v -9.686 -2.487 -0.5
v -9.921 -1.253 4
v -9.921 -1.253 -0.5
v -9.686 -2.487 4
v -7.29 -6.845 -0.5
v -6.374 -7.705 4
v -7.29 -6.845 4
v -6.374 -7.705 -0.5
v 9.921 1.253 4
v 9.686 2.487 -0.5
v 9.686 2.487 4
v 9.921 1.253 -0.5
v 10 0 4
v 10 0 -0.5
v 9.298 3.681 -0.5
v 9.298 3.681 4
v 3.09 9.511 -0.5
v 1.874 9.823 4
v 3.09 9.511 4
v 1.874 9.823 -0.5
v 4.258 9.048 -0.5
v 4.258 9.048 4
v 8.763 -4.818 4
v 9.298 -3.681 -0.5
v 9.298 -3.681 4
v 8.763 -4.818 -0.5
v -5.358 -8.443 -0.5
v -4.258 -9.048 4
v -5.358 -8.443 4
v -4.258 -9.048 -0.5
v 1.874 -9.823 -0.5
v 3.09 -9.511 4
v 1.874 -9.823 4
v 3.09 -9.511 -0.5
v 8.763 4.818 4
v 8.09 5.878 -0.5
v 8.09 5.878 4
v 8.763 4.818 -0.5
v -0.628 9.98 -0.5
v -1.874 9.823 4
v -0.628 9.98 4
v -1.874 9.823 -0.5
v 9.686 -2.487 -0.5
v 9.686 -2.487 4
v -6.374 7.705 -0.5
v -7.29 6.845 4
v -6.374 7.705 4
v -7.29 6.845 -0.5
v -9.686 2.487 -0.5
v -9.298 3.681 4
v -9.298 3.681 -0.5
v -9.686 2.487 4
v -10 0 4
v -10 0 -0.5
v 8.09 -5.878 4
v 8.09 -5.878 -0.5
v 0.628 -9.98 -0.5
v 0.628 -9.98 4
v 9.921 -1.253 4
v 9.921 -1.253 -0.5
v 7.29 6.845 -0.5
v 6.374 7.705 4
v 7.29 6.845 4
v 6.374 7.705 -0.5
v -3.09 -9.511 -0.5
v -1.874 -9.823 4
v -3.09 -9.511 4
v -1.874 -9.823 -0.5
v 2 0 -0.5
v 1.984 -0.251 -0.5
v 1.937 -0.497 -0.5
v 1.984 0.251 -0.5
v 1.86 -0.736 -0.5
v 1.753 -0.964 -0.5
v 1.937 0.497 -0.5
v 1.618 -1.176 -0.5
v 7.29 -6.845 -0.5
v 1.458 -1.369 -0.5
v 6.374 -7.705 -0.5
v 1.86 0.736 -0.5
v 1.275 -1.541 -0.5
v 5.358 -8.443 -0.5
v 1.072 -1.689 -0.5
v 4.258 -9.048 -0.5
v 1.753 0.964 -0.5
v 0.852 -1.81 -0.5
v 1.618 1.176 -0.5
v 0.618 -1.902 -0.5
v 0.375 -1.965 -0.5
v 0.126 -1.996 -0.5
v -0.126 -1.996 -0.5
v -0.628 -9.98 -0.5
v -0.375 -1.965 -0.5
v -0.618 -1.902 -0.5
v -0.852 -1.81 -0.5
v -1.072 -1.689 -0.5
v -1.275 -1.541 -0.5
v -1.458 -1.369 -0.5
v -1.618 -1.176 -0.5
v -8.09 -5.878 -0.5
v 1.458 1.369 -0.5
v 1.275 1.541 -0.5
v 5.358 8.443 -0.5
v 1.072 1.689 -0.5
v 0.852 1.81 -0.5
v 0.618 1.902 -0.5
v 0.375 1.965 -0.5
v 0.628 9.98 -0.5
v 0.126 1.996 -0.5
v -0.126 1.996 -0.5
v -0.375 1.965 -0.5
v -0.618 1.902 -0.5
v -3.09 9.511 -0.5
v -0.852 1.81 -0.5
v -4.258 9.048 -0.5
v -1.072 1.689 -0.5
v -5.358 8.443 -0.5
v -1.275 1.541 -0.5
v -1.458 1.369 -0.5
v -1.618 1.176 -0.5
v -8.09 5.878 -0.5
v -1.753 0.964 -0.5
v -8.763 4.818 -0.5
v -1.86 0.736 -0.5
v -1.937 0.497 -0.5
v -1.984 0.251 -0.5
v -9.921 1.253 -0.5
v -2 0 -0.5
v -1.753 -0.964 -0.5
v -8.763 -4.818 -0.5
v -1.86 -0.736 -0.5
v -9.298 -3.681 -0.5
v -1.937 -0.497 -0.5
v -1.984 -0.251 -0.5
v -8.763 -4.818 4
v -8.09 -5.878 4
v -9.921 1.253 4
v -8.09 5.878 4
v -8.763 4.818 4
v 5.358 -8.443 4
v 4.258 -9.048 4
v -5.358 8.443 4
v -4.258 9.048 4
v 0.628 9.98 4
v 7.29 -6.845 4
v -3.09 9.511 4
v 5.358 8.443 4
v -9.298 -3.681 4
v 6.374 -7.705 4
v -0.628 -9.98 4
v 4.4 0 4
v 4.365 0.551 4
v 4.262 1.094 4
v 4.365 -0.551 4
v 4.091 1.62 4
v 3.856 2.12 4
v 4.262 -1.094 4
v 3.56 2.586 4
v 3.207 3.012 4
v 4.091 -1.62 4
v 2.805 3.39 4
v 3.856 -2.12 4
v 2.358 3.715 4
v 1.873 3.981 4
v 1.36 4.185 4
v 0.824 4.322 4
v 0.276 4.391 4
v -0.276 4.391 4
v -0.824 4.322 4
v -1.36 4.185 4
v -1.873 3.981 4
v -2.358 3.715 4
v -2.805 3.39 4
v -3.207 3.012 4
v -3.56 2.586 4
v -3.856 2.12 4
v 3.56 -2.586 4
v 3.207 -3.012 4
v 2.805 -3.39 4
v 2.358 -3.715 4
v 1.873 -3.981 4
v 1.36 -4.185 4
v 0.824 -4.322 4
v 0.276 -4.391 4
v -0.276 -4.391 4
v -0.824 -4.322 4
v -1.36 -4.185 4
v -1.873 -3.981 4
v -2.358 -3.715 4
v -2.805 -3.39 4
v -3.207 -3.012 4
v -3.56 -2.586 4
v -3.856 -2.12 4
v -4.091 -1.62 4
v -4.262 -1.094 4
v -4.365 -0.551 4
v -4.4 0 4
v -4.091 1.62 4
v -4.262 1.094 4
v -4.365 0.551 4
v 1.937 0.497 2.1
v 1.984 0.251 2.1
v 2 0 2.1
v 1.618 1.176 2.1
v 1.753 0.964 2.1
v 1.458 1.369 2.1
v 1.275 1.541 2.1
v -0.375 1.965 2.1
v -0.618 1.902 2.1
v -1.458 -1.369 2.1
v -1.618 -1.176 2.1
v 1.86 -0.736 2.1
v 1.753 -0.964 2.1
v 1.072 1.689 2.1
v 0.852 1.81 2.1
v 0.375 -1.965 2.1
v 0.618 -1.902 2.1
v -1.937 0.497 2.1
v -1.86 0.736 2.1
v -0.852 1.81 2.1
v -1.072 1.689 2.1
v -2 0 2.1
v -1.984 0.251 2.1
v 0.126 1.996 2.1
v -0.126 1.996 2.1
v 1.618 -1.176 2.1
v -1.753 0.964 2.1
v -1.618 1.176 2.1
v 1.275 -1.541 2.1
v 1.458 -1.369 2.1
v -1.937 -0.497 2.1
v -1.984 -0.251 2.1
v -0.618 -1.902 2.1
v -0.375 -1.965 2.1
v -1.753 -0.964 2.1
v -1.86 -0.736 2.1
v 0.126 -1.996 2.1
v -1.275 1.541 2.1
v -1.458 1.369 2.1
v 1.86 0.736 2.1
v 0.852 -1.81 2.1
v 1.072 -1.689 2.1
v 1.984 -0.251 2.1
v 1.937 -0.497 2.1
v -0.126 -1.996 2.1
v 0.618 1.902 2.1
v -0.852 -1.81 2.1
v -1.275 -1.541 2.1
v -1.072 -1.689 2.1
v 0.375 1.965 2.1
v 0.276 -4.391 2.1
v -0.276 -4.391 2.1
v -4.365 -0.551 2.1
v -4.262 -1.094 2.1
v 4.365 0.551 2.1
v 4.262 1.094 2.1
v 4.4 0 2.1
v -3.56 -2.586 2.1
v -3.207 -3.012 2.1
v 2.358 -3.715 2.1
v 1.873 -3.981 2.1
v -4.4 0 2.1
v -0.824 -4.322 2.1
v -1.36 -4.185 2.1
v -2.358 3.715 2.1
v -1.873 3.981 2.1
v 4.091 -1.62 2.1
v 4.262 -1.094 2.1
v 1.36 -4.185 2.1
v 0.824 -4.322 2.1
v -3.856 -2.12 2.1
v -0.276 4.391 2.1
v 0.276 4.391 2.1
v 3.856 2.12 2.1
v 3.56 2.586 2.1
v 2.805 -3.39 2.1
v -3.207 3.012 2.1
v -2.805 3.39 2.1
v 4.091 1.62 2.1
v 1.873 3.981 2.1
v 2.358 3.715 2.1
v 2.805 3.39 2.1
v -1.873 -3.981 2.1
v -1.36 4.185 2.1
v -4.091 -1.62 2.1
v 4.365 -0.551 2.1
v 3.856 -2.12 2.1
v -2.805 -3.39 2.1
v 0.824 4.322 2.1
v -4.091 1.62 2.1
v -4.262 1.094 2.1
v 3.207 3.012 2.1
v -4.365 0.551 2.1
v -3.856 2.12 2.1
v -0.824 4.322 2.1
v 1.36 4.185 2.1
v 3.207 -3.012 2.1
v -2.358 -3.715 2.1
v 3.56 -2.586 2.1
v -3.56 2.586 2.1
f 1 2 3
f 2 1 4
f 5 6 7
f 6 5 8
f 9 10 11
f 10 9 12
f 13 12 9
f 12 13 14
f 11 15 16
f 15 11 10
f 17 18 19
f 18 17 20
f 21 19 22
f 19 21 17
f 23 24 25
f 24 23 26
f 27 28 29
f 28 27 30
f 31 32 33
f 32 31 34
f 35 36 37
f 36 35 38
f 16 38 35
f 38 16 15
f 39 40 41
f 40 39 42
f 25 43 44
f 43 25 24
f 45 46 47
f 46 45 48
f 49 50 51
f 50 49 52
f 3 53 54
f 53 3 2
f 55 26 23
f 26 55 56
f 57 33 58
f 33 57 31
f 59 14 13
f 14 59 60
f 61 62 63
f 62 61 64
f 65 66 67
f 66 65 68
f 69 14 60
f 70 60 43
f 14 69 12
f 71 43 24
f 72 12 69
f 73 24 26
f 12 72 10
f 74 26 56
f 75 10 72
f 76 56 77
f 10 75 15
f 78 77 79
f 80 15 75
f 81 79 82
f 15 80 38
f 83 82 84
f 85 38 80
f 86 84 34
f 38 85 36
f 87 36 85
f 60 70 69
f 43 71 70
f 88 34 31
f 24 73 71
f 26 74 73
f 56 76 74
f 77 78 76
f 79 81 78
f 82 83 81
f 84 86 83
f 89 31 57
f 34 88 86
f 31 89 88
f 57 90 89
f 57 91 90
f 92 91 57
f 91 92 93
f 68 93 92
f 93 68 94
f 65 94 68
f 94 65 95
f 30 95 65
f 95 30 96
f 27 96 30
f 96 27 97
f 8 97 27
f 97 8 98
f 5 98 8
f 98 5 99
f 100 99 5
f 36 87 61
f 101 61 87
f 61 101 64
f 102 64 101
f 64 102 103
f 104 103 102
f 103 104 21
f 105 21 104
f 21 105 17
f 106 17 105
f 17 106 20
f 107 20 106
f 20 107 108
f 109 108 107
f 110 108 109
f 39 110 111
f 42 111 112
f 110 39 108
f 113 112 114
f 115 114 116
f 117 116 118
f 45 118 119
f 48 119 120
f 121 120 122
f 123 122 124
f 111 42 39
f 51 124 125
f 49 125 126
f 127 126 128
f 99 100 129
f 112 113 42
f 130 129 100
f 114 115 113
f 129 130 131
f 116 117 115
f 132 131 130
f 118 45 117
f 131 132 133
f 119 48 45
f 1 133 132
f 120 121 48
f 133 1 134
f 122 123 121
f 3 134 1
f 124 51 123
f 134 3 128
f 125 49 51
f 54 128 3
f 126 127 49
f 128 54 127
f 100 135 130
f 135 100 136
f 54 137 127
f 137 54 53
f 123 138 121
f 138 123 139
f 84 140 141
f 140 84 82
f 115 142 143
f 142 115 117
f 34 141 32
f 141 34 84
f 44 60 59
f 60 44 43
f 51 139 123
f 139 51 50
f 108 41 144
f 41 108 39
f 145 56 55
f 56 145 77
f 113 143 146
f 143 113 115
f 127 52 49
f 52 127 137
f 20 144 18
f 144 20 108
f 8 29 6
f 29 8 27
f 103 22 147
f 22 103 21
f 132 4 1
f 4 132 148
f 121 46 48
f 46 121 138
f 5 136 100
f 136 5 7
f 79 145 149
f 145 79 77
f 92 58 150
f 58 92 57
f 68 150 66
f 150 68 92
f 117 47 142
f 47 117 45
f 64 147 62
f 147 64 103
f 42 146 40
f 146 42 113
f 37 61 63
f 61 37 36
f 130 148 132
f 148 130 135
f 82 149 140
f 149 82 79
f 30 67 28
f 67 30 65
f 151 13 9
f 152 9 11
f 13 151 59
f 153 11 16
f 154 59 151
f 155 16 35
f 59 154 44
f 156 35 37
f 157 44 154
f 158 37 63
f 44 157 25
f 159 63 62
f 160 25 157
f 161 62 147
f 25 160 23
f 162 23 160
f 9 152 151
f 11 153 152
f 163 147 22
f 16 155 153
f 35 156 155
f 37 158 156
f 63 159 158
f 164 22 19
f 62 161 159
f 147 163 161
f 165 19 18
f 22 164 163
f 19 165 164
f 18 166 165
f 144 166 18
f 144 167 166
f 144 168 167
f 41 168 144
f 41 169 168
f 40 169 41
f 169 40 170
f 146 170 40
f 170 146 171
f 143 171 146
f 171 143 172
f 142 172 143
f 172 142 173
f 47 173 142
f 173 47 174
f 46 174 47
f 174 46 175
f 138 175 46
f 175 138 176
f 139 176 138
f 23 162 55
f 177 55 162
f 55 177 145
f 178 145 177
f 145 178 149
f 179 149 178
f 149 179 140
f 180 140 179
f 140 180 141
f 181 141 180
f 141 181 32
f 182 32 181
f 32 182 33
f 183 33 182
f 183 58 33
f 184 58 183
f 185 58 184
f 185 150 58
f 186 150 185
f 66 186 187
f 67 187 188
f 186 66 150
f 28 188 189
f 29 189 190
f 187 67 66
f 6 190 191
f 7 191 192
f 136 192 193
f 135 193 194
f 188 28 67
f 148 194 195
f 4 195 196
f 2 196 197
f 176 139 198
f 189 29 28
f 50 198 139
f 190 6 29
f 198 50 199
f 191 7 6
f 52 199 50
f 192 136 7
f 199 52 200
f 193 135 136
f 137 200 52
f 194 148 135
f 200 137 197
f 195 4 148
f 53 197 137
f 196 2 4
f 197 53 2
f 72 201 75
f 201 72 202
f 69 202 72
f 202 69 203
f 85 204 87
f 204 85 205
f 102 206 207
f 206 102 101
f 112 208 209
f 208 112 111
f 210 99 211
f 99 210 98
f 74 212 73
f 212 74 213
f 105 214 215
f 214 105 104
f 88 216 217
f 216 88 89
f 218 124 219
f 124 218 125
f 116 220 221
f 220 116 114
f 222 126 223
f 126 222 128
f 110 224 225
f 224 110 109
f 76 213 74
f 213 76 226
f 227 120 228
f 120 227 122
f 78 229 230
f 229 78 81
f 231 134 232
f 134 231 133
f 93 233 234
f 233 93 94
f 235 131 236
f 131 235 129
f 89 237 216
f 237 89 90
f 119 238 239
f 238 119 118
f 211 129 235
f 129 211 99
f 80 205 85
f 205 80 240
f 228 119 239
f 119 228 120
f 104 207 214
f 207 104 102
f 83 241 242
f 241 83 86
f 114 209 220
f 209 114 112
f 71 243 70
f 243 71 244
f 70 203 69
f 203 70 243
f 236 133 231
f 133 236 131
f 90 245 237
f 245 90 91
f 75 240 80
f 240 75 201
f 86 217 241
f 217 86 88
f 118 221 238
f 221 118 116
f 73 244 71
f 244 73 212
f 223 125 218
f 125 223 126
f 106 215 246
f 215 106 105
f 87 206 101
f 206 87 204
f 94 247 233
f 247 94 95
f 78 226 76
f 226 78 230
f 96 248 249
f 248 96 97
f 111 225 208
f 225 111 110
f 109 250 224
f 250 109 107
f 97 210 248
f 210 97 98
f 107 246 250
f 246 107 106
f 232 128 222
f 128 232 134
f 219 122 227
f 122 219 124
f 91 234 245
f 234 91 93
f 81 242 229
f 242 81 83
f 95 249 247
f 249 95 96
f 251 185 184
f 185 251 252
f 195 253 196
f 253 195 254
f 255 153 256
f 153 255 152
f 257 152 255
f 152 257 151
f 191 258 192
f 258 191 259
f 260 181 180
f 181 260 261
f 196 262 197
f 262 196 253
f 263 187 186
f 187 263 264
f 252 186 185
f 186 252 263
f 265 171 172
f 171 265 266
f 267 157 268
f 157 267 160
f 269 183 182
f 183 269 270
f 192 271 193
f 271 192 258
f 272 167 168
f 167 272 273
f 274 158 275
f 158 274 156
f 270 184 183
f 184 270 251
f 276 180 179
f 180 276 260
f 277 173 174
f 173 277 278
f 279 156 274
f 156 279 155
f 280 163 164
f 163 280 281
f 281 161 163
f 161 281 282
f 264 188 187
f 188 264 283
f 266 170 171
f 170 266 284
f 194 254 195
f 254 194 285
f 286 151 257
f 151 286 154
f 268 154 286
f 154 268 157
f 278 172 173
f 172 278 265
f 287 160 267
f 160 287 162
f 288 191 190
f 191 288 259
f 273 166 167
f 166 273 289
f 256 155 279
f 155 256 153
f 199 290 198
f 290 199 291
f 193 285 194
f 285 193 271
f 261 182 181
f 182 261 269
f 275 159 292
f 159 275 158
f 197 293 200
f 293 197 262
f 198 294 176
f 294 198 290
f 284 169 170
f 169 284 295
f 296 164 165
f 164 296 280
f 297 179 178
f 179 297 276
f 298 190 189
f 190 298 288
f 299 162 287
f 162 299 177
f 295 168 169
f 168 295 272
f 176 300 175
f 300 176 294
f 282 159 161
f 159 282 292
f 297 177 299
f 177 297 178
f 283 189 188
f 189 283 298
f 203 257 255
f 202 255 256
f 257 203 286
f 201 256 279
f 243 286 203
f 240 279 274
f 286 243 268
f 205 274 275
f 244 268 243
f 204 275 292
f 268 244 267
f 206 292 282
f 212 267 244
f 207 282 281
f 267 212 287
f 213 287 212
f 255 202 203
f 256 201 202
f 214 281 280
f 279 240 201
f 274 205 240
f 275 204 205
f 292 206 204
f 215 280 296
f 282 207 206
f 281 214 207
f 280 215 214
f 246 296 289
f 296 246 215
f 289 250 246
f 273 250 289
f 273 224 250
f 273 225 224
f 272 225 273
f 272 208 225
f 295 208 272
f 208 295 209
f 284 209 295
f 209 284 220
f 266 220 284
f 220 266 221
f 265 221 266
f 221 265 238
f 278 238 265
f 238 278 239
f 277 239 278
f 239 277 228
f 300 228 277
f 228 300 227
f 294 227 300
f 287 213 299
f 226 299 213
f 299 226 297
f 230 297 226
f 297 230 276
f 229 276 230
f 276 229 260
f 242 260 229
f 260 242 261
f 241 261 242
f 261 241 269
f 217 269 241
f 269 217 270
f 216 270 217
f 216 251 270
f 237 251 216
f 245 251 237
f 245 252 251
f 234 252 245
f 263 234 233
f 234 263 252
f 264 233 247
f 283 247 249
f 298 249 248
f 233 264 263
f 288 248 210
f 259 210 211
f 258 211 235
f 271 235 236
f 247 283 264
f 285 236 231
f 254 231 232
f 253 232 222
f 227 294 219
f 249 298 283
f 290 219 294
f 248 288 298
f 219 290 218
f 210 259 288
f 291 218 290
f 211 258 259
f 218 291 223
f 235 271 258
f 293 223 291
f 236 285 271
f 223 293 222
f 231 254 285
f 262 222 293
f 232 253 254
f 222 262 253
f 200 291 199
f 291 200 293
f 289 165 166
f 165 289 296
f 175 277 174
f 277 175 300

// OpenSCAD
// finish_washer.scad
// library for parametric finishing washer, button, ring, pad, accent
// Author: Tony Z. Tonchev, Michigan (USA) 
// last update: November 2018

// Washer diameter (in mm): 3x or larger than Screw Gauge.
Washer_Diameter = 20;

// General washer shape
Washer_Type = 1; //[1:CYLINDER, 2:CONE, 3:CHAMFER, 4:DOME]

// Screw shaft diameter (in mm): #4-3mm, #6-3.5mm, #8-4mm, #9-4.5mm, #10-5mm
Screw_Gauge = 4;

// General screw head type
Screw_Head_Type = 1; //[1:FLUSH, 2:RECESSED]

/* [Hidden] */

$fn=50;
TZT_Rad = Washer_Diameter/2;
TZT_Sad = Screw_Gauge/2;
TZT_Thk = Screw_Gauge;
TZT_Wty = Washer_Type;
TZT_Sty = Screw_Head_Type;

difference () {
    TZT_Washer ();
    TZT_Hole ();
}

//-----------------

module TZT_Washer () {
    translate ([0,0,-0.5]) cylinder (0.5, TZT_Rad, TZT_Rad);
    if (TZT_Wty==2) {
        cylinder (TZT_Thk, TZT_Rad, TZT_Sad*2);
    } else if (TZT_Wty==3) {
        cylinder (TZT_Thk*0.7, TZT_Rad, TZT_Rad);
        translate ([0,0,TZT_Thk*0.7]) cylinder (TZT_Thk*0.3, TZT_Rad, TZT_Rad-TZT_Thk*0.3);
    } else if (TZT_Wty==4) {
        difference () {
            scale ([1,1,TZT_Thk/TZT_Rad]) sphere (TZT_Rad);
            translate ([0,0,-TZT_Thk]) cylinder (TZT_Thk, TZT_Rad, TZT_Rad);
        }
    } else {
        cylinder (TZT_Thk, TZT_Rad, TZT_Rad);
    }
}

module TZT_Hole () {
    translate ([0,0,-1]) cylinder (TZT_Thk*9, TZT_Sad, TZT_Sad);
    if (TZT_Sty==2) {
        translate  ([0,0,TZT_Sad+0.1]) cylinder (TZT_Sad, TZT_Sad, TZT_Sad*2);
    } else {
        translate  ([0,0,TZT_Sad+0.1]) cylinder (TZT_Sad, TZT_Sad*2.2, TZT_Sad*2.2);
    }
}
